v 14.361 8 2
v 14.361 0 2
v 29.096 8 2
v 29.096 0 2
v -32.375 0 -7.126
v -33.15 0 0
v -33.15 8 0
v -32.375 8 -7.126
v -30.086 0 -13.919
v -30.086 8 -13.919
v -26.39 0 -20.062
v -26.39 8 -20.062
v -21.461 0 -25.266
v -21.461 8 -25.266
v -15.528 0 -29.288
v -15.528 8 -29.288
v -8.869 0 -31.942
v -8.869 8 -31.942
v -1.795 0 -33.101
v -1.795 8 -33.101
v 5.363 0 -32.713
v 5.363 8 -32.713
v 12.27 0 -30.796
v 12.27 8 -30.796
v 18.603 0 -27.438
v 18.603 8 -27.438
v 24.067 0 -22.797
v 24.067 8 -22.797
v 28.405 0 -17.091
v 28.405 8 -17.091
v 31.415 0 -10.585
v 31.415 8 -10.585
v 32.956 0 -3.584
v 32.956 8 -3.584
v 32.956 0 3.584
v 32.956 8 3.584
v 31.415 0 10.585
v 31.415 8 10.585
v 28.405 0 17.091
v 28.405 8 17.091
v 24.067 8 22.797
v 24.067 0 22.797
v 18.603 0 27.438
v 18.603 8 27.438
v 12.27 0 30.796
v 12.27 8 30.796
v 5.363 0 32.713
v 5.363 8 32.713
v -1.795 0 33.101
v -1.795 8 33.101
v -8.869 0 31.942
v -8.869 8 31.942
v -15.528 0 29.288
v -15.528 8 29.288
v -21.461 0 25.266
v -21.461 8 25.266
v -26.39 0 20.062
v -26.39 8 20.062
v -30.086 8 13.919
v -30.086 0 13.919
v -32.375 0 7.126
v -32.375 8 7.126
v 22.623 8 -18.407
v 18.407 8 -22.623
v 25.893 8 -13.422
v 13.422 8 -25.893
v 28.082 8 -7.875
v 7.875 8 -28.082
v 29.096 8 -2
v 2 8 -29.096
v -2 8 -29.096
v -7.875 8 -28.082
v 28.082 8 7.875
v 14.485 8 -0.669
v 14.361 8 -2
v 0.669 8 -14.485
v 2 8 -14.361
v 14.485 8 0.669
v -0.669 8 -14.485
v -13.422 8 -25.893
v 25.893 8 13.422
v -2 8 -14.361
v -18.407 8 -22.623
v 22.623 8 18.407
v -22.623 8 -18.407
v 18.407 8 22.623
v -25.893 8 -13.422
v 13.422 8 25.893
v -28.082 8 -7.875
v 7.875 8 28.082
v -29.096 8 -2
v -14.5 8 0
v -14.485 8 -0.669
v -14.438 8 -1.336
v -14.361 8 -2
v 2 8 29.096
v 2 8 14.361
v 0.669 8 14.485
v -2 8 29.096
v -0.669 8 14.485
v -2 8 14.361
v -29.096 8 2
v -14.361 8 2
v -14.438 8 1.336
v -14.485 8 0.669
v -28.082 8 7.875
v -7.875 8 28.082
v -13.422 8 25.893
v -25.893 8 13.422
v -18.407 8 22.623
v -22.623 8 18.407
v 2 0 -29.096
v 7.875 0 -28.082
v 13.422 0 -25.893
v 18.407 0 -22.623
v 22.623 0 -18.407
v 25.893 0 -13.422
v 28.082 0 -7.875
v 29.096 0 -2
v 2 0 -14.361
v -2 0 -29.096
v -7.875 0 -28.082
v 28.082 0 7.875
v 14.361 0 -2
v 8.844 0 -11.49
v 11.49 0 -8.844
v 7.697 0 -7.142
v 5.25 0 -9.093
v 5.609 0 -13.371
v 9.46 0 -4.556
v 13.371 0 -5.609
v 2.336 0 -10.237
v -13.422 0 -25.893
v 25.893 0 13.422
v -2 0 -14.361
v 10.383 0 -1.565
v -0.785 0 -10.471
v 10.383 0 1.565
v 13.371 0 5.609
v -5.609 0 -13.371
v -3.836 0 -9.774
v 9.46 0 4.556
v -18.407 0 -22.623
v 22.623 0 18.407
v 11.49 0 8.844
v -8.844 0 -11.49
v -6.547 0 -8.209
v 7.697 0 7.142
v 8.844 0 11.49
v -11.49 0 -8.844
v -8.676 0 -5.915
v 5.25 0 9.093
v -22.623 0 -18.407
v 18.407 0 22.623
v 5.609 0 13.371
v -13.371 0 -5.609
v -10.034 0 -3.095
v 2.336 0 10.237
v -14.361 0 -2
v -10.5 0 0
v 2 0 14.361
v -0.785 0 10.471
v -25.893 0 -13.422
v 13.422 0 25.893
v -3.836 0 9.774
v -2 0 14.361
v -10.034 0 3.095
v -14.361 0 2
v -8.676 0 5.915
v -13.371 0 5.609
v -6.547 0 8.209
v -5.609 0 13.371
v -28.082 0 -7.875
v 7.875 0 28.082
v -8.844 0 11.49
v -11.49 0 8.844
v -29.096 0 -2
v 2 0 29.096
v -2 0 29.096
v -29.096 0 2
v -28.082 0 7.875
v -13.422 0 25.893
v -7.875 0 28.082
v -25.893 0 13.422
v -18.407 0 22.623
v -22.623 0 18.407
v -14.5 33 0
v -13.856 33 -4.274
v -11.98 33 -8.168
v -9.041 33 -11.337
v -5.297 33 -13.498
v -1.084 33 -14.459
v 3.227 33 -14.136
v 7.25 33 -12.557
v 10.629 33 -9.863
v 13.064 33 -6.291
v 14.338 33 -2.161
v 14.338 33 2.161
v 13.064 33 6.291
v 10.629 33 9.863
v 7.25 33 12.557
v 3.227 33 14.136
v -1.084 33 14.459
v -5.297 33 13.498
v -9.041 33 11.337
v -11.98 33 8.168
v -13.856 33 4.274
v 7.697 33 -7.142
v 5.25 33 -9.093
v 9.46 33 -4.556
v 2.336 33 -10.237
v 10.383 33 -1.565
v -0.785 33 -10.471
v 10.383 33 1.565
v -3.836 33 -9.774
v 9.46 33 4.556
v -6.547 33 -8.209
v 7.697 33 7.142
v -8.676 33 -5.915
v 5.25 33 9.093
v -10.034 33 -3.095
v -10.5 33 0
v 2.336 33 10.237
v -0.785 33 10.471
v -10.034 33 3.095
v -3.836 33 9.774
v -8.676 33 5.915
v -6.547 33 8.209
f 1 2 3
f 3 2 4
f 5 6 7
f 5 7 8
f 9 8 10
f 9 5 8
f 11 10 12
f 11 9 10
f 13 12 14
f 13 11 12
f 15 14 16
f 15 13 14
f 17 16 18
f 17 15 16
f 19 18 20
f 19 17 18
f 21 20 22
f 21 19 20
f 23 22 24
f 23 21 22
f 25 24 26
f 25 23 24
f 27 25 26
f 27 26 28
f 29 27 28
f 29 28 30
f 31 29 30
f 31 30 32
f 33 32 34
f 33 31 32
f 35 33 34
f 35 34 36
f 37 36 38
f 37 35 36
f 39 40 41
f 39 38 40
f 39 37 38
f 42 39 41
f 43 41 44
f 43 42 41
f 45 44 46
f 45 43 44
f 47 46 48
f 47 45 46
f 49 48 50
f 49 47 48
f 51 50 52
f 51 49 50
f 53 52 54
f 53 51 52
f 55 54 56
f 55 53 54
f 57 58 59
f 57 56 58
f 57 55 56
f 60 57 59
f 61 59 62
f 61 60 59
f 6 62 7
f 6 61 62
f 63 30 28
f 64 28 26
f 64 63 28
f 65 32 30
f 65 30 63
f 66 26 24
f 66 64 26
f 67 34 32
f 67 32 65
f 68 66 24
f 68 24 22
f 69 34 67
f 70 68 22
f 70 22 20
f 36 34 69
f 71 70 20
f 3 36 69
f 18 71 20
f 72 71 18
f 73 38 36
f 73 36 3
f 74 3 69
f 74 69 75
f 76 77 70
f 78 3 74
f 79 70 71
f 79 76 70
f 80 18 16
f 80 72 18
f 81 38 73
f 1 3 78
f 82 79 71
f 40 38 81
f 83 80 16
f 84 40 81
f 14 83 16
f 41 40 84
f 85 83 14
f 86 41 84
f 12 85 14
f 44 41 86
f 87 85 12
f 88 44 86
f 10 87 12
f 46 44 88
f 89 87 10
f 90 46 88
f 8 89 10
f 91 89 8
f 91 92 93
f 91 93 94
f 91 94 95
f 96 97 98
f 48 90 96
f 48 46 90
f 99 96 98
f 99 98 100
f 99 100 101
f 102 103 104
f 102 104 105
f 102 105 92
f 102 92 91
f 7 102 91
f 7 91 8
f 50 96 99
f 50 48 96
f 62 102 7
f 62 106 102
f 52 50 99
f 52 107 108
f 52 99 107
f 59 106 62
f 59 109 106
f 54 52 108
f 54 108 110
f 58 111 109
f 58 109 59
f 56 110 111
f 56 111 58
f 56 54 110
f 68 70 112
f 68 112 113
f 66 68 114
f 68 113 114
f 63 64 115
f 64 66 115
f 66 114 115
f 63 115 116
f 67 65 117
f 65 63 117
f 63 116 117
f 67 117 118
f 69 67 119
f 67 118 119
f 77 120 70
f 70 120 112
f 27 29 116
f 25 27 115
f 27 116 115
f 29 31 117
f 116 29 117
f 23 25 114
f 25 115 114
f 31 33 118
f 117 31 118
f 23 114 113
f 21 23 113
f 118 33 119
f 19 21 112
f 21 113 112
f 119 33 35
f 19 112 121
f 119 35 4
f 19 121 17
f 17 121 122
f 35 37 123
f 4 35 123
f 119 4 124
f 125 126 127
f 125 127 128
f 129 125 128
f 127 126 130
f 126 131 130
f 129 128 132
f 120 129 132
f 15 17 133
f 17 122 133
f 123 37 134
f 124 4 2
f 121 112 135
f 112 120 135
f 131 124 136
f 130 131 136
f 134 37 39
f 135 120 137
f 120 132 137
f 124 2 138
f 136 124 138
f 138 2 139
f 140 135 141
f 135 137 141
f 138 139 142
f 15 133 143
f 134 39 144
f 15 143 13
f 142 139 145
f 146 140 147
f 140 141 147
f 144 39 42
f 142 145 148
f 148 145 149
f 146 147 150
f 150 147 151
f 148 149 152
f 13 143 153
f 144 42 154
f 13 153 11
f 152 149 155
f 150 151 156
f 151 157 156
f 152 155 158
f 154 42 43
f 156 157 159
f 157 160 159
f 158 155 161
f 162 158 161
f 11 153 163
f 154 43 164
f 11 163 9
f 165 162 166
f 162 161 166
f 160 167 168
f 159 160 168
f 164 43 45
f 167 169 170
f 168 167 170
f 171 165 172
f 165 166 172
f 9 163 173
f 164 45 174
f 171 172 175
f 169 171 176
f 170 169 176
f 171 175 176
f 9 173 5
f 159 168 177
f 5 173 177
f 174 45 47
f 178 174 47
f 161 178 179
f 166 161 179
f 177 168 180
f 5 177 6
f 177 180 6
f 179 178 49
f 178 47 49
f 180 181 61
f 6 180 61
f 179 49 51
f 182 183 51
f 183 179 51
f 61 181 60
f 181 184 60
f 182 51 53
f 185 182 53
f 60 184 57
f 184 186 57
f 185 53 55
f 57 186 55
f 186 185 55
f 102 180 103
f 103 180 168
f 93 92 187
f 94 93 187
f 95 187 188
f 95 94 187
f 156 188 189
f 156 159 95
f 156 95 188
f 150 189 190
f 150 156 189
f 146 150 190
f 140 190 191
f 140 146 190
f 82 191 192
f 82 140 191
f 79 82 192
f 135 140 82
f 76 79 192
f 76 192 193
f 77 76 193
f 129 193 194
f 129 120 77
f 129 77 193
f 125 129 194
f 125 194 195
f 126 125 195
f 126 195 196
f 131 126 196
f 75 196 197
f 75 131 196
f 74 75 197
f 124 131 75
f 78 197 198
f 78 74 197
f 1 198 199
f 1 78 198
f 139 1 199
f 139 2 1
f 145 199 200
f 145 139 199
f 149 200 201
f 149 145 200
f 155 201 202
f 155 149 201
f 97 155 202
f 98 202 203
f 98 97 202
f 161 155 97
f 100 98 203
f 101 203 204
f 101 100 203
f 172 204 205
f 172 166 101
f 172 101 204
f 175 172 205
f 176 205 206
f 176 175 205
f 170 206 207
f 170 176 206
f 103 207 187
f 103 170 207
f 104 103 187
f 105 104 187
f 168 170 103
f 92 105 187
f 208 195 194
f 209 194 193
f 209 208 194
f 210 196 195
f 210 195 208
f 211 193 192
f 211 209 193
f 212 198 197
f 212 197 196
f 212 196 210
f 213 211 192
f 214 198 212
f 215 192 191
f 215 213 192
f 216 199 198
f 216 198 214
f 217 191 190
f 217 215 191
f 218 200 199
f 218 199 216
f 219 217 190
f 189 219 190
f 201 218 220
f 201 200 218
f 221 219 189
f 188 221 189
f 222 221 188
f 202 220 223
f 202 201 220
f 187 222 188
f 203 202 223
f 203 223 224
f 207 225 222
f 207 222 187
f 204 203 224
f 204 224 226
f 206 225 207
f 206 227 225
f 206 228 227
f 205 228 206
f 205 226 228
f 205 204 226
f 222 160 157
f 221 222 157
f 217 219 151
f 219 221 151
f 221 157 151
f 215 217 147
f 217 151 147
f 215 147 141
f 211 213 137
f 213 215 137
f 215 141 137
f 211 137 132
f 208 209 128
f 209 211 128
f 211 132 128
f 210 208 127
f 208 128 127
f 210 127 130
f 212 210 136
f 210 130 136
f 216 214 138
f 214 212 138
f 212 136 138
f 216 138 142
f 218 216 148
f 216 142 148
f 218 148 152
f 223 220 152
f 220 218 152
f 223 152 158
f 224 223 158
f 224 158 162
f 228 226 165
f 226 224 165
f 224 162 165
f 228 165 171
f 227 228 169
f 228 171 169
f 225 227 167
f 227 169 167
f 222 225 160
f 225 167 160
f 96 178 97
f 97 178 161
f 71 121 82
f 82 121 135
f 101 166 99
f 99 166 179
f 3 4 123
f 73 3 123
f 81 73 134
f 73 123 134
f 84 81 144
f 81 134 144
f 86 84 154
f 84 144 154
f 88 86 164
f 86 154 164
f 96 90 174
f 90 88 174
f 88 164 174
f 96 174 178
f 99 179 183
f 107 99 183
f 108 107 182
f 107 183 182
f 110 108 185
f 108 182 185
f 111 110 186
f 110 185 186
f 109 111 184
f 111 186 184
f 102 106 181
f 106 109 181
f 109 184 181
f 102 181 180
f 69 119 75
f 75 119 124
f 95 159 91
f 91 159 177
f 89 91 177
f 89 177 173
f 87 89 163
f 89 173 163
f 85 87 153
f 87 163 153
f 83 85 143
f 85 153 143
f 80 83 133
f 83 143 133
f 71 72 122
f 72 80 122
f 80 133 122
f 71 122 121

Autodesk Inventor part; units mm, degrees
ref_plane "YZ Plane" through (0, 0, 0) normal (1, 0, 0) x (0, 1, 0)
ref_plane "XZ Plane" through (0, 0, 0) normal (0, 1, 0) x (-1, 0, 0)
ref_plane "XY Plane" through (0, 0, 0) normal (0, 0, 1) x (1, 0, 0)
sketch "Sketch1" plane through (0, 0, 0) normal (0, 1, 0) x (-1, 0, 0)
  circle A0 centre (0, 0) radius 33.15
  circle A1 centre (0, 0) radius 29.165
  circle A2 centre (0, 0) radius 10.5
  circle A3 centre (0, 0) radius 14.5
  dimension "d0" = 66.3
  dimension "d1" = 58.33
  dimension "d2" = 21
  dimension "d3" = 29
sketch "Sketch2" plane through (0, 0, 0) normal (0, 1, 0) x (-1, 0, 0)
  line L0 (2, 33) -> (-2, 33)
  line L1 (-2, 33) -> (-2, 12)
  line L2 (-2, 12) -> (2, 12)
  line L3 (2, 12) -> (2, 33)
  line L4 (33, 2) -> (12, 2)
  line L5 (12, 2) -> (12, -2)
  line L6 (12, -2) -> (33, -2)
  line L7 (33, -2) -> (33, 2)
  line L8 (2, -12) -> (-2, -12)
  line L9 (-2, -12) -> (-2, -33)
  line L10 (-2, -33) -> (2, -33)
  line L11 (2, -33) -> (2, -12)
  line L12 (-12, 2) -> (-33, 2)
  line L13 (-33, 2) -> (-33, -2)
  line L14 (-33, -2) -> (-12, -2)
  line L15 (-12, -2) -> (-12, 2)
  point P0 (0, 0)
  point P1 (12, 0)
  point P2 (0, -12)
  point P3 (-33, 0)
  dimension "d4" = 4
  dimension "d5" = 4
  dimension "d6" = 12
  dimension "d7" = 12
  dimension "d8" = 12
  dimension "d9" = 12
  dimension "d10" = 21
  dimension "d11" = 21
  dimension "d12" = 21
  dimension "d13" = 21
  dimension "d14" = 2
  dimension "d15" = 2
extrude "Extrusion1" add sketch "Sketch1" along normal blind 8
extrude "Extrusion2" add sketch "Sketch2" along normal blind 8
extrude "Extrusion3" add sketch "Sketch1" along normal blind 33 contours A3
equation "\"d11\" = d10"
equation "\"d12\" = d10"
equation "\"d13\" = d10"
properties part number "Calibrator"
